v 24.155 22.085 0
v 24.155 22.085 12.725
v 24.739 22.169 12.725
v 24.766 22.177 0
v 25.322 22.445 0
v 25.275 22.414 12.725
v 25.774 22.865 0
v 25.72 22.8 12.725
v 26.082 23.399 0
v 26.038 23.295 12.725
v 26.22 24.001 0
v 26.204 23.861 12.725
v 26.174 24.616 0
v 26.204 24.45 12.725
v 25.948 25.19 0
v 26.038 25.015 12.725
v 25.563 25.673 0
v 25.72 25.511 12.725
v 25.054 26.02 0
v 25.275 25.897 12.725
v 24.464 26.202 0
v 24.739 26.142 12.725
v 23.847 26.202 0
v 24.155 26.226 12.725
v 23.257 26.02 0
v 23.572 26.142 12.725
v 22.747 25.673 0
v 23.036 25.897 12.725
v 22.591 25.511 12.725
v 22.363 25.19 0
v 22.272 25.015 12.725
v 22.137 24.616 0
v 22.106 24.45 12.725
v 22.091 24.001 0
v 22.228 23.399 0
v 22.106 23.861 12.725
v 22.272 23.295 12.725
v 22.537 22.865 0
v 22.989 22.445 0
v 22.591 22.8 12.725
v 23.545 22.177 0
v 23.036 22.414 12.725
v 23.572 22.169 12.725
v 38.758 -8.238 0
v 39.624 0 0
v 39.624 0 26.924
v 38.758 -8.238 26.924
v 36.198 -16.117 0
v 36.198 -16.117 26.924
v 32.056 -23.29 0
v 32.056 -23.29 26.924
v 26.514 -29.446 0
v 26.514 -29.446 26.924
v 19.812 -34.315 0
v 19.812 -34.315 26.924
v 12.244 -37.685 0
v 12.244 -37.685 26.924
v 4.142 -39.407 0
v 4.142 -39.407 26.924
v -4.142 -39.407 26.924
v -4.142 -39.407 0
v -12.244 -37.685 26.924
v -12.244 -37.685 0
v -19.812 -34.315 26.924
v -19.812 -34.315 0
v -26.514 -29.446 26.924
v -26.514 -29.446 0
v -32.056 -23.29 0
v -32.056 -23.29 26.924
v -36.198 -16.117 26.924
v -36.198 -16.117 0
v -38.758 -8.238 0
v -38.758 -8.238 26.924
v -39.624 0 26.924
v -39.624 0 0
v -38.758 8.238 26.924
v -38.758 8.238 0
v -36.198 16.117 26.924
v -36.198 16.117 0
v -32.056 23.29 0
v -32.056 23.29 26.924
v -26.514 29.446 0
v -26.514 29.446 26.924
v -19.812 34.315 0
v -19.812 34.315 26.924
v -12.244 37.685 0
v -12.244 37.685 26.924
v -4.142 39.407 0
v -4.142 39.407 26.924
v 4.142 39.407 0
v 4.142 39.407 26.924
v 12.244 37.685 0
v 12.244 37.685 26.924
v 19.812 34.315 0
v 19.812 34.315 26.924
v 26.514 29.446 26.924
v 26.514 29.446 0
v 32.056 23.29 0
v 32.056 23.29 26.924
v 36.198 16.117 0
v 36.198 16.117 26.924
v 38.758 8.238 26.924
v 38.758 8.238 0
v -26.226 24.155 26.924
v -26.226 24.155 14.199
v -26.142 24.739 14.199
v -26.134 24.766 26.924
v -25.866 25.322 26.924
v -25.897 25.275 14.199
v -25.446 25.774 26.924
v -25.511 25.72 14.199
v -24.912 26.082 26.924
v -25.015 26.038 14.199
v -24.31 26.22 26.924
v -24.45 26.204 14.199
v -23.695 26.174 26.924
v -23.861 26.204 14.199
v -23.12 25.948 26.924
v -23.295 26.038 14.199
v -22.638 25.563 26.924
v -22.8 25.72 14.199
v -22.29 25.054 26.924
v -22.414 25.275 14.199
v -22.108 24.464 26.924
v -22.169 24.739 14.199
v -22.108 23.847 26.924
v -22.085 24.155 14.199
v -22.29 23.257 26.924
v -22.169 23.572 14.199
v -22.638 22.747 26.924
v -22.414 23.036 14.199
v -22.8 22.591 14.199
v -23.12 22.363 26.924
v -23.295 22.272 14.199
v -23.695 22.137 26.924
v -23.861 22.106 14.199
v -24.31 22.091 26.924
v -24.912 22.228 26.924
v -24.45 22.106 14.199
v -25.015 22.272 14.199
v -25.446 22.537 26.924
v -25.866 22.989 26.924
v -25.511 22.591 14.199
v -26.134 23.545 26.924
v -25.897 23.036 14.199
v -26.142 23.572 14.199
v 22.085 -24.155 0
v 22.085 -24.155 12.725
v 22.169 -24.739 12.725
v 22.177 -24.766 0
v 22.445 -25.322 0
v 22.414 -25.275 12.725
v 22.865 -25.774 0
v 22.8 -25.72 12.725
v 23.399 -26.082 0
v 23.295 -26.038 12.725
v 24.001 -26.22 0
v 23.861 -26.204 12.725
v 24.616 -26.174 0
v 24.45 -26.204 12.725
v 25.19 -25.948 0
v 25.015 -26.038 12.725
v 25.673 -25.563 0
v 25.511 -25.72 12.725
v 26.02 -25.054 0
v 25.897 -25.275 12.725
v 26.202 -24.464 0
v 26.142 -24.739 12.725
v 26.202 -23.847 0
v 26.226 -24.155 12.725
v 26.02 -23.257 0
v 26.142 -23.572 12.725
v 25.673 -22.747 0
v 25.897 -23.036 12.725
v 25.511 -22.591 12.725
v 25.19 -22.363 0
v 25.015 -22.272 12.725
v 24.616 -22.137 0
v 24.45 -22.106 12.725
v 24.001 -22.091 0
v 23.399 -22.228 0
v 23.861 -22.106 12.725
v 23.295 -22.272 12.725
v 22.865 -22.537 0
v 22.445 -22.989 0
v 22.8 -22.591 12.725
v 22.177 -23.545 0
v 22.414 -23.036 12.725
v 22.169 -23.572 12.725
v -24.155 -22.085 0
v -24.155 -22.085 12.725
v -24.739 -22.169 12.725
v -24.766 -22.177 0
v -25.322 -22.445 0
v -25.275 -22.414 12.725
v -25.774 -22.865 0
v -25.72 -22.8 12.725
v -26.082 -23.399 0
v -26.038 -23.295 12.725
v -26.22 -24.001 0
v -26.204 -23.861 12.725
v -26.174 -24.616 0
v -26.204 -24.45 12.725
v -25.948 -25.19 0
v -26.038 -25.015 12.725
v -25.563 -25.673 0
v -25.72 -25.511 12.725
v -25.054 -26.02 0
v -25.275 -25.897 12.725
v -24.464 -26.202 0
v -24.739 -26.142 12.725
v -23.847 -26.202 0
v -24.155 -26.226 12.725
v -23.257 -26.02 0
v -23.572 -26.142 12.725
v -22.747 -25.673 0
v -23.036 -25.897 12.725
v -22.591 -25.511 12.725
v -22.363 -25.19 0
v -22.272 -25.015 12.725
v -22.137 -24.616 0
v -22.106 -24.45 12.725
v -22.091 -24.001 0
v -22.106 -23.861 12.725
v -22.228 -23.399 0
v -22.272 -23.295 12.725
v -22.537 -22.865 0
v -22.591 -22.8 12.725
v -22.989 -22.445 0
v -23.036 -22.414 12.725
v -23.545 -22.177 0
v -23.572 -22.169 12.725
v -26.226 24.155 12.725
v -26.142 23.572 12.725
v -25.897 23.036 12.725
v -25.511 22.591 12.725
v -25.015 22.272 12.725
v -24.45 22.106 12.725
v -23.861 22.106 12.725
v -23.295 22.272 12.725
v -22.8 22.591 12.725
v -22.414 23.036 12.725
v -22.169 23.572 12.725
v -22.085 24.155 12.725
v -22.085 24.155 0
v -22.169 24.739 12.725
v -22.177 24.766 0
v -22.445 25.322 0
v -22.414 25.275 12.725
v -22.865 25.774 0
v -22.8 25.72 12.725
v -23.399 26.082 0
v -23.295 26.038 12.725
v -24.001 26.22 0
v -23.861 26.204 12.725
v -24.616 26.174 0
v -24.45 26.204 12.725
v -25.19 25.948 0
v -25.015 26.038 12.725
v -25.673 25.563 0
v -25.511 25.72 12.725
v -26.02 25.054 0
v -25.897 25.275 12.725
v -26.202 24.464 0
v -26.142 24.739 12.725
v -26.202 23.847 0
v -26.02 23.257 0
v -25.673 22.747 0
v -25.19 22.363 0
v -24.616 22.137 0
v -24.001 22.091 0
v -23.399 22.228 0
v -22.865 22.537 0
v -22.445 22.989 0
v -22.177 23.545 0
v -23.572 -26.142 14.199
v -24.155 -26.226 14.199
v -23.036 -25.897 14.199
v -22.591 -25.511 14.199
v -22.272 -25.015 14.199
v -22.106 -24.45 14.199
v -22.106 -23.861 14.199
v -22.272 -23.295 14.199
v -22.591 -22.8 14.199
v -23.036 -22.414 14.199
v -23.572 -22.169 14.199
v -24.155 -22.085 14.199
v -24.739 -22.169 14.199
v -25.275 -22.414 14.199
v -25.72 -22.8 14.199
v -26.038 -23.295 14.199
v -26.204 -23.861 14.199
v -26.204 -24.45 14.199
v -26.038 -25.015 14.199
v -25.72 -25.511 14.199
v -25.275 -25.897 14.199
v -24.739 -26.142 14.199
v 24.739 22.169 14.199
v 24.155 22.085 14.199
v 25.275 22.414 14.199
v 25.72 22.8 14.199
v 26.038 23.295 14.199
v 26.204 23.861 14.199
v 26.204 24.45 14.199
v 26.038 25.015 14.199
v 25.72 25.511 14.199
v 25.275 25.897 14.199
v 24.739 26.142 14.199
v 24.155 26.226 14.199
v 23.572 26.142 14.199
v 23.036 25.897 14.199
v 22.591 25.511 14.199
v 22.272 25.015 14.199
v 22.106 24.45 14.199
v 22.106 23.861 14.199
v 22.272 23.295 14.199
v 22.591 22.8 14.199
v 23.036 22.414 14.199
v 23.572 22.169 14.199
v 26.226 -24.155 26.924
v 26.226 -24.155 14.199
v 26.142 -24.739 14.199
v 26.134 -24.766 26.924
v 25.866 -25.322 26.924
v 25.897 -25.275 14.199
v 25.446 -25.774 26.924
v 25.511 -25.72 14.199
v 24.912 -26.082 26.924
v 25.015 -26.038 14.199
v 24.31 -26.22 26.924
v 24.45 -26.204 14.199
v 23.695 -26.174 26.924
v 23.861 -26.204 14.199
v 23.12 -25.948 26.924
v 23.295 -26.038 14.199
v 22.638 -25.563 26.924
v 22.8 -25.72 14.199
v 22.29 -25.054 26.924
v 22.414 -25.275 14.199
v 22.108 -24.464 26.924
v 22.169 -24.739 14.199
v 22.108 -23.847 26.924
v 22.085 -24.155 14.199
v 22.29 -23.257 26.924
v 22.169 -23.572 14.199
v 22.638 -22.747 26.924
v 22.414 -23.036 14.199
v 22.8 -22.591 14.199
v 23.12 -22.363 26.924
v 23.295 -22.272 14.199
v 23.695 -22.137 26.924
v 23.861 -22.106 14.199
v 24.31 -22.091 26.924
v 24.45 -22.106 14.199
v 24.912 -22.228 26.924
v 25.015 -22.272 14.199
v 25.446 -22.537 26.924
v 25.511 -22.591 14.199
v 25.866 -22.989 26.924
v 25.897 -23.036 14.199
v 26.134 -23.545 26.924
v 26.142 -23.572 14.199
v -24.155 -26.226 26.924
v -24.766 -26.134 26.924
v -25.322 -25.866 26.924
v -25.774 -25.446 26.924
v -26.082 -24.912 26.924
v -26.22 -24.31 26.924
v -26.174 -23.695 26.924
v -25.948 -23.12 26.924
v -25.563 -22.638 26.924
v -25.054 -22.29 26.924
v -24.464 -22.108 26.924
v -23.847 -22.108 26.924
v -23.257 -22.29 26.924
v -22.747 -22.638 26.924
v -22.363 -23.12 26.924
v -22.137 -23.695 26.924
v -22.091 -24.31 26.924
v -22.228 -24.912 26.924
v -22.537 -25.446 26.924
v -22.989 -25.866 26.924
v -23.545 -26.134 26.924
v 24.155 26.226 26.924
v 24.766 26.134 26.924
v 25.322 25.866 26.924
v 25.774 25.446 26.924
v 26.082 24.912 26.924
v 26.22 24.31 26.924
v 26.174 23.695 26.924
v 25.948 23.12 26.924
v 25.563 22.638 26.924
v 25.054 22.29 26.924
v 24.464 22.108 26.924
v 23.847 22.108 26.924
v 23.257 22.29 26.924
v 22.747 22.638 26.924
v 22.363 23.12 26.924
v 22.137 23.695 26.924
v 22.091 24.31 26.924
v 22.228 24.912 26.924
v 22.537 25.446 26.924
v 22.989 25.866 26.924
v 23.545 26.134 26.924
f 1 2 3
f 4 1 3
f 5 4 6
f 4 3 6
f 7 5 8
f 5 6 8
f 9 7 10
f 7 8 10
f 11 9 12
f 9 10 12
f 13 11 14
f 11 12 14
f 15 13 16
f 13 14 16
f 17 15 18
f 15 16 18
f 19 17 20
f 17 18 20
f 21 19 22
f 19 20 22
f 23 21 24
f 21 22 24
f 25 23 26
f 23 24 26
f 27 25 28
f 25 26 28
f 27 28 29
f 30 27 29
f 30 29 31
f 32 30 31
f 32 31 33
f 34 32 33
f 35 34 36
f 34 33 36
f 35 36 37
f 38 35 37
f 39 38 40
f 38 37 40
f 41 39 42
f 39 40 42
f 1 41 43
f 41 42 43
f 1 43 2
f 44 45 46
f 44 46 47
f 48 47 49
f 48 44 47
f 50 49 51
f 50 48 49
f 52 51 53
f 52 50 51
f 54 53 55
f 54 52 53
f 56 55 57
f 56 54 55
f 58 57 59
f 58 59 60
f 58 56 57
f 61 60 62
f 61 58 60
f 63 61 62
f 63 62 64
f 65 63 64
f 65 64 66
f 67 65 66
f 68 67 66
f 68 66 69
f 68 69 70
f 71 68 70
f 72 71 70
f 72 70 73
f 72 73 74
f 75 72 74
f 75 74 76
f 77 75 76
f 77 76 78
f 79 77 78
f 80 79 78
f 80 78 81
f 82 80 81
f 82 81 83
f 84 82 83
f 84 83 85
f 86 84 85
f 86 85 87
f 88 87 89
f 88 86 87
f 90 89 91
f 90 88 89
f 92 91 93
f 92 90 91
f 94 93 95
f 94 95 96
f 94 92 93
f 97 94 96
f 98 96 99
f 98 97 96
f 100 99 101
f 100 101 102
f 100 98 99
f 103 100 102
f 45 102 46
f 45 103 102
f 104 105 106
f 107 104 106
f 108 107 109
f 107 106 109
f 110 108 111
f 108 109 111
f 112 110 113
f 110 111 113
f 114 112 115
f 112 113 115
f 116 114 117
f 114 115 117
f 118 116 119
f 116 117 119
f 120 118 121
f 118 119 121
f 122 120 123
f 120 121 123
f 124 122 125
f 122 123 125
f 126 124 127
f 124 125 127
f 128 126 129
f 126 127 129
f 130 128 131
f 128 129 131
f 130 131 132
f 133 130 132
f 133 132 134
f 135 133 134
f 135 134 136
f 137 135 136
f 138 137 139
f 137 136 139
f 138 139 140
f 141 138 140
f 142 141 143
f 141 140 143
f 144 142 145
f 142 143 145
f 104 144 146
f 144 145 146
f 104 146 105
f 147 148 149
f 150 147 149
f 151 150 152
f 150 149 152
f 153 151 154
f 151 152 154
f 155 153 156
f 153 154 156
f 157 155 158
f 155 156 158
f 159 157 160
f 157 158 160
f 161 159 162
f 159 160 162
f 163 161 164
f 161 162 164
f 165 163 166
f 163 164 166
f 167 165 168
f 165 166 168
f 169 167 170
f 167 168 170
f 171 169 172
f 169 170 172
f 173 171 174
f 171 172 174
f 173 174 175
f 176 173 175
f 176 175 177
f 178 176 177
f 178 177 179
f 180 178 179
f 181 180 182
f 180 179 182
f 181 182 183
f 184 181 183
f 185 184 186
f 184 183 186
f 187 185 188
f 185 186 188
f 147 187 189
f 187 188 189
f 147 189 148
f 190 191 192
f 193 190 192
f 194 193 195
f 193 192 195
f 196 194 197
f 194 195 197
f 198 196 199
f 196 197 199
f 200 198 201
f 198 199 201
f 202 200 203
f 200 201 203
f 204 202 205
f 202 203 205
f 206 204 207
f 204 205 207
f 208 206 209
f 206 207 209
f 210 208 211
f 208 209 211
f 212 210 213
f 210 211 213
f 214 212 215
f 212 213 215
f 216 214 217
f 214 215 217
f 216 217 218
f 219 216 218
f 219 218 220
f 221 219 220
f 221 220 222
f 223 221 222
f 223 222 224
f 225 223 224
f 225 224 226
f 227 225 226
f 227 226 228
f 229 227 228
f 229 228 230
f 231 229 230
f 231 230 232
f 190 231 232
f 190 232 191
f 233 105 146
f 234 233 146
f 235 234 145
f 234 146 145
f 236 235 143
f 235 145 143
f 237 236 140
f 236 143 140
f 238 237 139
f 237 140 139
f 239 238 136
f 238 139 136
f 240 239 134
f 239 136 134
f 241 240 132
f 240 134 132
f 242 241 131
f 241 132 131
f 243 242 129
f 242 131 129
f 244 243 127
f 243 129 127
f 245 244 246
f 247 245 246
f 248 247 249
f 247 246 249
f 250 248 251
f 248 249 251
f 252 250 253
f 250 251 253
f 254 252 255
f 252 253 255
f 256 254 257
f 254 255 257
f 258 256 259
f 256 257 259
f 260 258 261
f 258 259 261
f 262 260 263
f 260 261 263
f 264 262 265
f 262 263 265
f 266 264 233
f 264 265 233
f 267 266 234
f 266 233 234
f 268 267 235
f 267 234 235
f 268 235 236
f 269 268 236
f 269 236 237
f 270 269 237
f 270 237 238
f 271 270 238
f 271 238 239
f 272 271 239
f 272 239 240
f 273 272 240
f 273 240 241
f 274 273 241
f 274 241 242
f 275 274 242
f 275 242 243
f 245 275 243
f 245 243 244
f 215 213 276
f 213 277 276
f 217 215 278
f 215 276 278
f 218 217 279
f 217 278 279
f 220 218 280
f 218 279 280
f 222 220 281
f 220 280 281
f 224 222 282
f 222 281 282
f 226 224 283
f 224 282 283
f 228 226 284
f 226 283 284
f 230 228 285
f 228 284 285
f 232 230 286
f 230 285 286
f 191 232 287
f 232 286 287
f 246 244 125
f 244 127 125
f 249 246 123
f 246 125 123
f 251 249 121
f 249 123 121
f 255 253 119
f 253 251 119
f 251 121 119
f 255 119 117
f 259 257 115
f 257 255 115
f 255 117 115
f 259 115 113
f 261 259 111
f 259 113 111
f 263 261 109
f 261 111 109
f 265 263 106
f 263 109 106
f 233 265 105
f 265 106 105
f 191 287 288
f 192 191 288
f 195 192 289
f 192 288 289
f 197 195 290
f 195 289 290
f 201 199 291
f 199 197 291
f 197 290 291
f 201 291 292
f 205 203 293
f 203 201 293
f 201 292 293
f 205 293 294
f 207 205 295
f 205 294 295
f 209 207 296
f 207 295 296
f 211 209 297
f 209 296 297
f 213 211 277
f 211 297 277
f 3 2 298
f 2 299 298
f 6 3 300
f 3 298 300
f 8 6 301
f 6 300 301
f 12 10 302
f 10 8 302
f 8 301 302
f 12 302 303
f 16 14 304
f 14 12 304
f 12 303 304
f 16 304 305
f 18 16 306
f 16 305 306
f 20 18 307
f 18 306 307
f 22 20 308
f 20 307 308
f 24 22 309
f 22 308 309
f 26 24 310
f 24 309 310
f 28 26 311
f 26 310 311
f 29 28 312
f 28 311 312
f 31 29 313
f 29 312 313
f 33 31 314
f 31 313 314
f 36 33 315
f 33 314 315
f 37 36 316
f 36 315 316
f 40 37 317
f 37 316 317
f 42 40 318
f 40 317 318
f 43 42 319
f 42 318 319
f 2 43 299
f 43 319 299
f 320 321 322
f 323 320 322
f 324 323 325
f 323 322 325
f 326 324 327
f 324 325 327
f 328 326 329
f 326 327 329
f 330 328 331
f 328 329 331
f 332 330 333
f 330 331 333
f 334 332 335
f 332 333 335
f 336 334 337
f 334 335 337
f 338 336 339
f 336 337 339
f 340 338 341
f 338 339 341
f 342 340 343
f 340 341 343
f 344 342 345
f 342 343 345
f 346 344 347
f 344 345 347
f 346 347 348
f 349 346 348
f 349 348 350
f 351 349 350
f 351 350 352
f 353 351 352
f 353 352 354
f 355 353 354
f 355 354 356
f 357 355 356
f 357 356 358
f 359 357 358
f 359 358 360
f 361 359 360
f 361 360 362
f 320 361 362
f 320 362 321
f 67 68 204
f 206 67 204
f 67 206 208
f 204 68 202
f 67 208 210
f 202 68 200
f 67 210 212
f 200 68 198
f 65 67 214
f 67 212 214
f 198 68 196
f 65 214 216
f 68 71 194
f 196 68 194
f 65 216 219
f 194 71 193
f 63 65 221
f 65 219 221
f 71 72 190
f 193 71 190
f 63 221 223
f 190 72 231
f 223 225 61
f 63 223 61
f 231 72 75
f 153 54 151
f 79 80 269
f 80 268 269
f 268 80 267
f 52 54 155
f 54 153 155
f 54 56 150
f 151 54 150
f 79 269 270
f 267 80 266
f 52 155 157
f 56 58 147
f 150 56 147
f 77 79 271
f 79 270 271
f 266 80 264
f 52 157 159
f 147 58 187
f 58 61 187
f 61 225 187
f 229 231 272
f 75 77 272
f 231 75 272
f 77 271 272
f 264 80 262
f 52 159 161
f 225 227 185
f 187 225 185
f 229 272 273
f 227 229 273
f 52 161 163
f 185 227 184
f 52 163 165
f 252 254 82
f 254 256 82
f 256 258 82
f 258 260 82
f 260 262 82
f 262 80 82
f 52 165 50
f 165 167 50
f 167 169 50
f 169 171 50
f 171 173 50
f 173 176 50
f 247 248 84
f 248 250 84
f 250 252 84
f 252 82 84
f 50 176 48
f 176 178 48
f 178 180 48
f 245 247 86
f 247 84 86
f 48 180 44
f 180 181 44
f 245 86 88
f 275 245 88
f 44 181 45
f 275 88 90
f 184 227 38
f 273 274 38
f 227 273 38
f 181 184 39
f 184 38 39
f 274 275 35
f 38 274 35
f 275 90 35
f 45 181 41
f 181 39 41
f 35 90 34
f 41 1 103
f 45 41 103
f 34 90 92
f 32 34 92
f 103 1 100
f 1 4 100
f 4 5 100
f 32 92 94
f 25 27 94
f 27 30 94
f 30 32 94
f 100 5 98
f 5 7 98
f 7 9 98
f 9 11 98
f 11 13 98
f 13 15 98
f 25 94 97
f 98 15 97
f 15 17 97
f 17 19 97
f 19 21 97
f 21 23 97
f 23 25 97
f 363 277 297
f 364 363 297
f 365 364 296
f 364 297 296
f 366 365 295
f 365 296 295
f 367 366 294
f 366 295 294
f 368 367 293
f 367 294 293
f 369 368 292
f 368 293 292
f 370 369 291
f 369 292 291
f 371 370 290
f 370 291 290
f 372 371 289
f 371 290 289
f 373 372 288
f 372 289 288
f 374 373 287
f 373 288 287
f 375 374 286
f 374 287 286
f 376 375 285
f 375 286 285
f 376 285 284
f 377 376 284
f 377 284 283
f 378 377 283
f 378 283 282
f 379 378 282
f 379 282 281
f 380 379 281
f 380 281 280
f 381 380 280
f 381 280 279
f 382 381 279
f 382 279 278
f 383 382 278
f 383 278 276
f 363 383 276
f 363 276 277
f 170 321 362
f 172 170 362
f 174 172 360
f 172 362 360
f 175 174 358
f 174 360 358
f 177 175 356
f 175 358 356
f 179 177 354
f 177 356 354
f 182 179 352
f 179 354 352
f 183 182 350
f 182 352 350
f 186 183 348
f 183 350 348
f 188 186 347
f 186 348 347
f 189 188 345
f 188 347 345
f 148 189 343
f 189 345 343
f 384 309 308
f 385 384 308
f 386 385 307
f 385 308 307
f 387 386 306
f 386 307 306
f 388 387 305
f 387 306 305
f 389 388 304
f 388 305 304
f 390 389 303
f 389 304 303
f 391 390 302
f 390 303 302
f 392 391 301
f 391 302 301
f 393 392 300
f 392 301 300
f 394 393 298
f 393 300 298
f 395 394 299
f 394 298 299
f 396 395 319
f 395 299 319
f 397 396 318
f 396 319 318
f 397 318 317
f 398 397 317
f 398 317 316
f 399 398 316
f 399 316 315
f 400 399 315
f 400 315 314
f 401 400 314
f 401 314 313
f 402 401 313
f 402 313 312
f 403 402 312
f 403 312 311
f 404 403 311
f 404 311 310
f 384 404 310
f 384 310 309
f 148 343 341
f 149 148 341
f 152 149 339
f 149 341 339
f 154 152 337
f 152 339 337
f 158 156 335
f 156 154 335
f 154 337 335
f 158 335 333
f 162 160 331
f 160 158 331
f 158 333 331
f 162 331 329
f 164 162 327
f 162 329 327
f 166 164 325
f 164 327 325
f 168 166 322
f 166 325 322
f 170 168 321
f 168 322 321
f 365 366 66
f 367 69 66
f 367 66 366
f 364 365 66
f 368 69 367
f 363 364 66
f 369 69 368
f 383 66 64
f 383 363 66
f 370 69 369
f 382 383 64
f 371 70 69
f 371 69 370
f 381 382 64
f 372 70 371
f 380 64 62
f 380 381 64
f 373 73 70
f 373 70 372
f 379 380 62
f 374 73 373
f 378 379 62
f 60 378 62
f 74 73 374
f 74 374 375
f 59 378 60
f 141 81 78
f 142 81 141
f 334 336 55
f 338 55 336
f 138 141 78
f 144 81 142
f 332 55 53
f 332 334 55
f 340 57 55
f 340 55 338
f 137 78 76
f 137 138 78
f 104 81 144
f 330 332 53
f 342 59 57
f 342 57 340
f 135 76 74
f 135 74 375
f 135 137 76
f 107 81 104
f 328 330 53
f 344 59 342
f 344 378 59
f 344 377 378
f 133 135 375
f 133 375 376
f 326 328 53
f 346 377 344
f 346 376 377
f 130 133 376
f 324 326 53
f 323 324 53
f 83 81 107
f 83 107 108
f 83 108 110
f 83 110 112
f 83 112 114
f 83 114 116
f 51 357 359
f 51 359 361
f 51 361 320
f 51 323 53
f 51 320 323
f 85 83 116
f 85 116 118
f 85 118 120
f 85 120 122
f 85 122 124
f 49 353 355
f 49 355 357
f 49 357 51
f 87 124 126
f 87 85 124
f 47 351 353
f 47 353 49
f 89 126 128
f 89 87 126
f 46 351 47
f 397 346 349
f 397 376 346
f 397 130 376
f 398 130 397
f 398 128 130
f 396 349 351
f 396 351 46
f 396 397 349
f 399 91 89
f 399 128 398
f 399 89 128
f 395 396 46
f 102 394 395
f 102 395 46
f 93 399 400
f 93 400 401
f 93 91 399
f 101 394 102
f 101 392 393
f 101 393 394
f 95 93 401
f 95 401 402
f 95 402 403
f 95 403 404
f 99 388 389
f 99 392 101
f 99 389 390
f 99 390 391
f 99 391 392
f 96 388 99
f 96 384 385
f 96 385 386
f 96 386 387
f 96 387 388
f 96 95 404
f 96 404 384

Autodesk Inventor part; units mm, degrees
ref_plane "YZ Plane" through (0, 0, 0) normal (1, 0, 0) x (0, 1, 0)
ref_plane "XZ Plane" through (0, 0, 0) normal (0, 1, 0) x (-1, 0, 0)
ref_plane "XY Plane" through (0, 0, 0) normal (0, 0, 1) x (1, 0, 0)
sketch "Sketch1" plane through (0, 0, 0) normal (0, 0, 1) x (1, 0, 0)
  line L0 (0, 55.4736) -> (0, -55.4736) projected
  line L1 (-55.4736, 0) -> (55.4736, 0) projected
  circle A0 centre (0, 0) radius 39.624
  circle A1 centre (0, 0) radius 10.3188
  dimension "d0" = 20.6375
  dimension "d1" = 79.248
extrude "Extrusion1" add sketch "Sketch1" along normal blind 26.924
sketch "Sketch2" plane through (0, 0, 0) normal (0, 0, -1) x (-1, 0, 0)
  line L0 (0, -55.4736) -> (0, 55.4736) projected
  line L1 (-55.4736, 0) -> (55.4736, 0) projected
  line L2 (-24.1554, -24.1554) -> (24.1554, -24.1554) construction
  line L3 (24.1554, -24.1554) -> (24.1554, 24.1554) construction
  line L4 (24.1554, 24.1554) -> (-24.1554, 24.1554) construction
  line L5 (-24.1554, 24.1554) -> (-24.1554, -24.1554) construction
  line L6 (-24.1554, -24.1554) -> (24.1554, 24.1554) construction
  line L7 (24.1554, -24.1554) -> (-24.1554, 24.1554) construction
  point P0 (0, 0)
  dimension "d22" = 48.3108
hole "Hole1" at (-24.1554, -24.1554, 0) direction (0, 0, 1) diameter 4.1402 depth 14.1986 tip angle 118
sketch "Sketch3" plane through (0, 0, 26.924) normal (0, 0, 1) x (1, 0, 0)
  circle A0 centre (-24.1554, -24.1554) radius 2.0701 projected
  point P0 (0, 0)
hole "Hole2" at (-24.1554, -24.1554, 26.924) direction (0, 0, -1) diameter 4.1402 depth 14.1986 tip angle 118
pattern_circular "Circular Pattern1" count 4 over 360 about axis through (0, 0, -10) along (0, 0, 1) of "Hole1", "Hole2"
properties part number "J008109" material "ALUMINUM, 6061-T651"
